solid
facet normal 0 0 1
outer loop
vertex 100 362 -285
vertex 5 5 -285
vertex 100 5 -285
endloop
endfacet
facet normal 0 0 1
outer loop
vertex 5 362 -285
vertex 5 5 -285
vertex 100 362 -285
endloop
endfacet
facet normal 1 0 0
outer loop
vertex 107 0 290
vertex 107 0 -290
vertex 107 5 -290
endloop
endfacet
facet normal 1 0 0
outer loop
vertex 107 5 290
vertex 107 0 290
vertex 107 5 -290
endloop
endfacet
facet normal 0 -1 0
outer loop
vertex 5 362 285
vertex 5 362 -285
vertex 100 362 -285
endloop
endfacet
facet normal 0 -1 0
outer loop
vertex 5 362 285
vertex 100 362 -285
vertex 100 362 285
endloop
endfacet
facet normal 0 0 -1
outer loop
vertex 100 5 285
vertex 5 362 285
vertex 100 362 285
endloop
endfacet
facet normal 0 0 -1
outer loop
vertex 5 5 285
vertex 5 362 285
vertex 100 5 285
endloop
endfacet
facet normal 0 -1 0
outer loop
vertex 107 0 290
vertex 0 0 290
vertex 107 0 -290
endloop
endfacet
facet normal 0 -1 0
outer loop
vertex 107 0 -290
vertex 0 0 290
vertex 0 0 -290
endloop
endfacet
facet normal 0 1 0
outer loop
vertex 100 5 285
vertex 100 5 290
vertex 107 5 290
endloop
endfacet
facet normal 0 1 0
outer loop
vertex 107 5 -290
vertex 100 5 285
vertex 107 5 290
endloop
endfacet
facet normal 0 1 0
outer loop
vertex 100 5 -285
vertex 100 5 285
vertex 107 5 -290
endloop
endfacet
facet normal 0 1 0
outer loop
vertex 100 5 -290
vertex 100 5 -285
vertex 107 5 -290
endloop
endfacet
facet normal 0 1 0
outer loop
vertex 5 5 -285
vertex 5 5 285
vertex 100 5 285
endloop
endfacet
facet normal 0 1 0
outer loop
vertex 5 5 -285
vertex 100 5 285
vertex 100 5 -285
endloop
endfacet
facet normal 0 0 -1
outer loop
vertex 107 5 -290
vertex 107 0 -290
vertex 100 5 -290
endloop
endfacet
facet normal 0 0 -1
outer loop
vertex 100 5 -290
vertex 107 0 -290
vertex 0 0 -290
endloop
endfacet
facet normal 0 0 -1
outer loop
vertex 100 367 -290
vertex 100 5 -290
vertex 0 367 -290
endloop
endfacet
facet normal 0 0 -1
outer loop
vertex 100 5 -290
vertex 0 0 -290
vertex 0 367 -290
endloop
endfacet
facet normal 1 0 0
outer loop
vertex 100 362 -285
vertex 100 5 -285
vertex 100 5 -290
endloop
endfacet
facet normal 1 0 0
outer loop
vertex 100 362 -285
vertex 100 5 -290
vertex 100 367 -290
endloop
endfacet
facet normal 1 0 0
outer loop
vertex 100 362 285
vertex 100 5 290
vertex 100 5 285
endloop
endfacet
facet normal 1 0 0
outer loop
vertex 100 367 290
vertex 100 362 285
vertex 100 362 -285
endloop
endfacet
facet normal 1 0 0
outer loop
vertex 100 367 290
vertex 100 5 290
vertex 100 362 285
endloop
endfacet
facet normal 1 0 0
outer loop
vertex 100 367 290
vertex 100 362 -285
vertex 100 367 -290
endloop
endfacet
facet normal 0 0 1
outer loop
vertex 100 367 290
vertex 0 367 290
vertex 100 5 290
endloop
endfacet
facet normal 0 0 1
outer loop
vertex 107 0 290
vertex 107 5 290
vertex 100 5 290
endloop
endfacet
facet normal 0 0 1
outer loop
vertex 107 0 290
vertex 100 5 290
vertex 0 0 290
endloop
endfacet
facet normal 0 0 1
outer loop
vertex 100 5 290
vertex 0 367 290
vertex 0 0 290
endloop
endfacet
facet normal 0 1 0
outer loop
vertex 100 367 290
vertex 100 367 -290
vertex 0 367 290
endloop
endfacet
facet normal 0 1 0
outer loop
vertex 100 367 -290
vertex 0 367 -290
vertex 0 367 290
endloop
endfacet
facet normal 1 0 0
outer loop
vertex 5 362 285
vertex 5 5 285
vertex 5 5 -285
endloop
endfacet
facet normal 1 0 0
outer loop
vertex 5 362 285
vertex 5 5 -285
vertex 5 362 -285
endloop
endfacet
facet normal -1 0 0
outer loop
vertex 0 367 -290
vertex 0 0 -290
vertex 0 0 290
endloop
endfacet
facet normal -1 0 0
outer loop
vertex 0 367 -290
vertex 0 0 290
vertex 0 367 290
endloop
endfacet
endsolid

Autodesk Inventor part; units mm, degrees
ref_plane "YZ Plane" through (0, 0, 0) normal (1, 0, 0) x (0, 1, 0)
ref_plane "XZ Plane" through (0, 0, 0) normal (0, 1, 0) x (-1, 0, 0)
ref_plane "XY Plane" through (0, 0, 0) normal (0, 0, 1) x (1, 0, 0)
sketch "스케치1" plane through (0, 0, 0) normal (1, 0, 0) x (0, 1, 0)
  line L0 (367, 290) -> (0, 290)
  line L1 (0, 290) -> (0, -290)
  line L2 (0, -290) -> (367, -290)
  line L3 (367, -290) -> (367, 290)
  line L4 (362, 285) -> (5, 285)
  line L5 (5, 290) -> (5, -290)
  line L6 (5, -285) -> (362, -285)
  line L7 (362, -285) -> (362, 285)
  point P0 (0, 0)
  point P1 (0, 0)
  dimension "d0" = 367
  dimension "d1" = 580
  dimension "d2" = 5
extrude "돌출1" add sketch "스케치1" along normal blind 100 contours L3 L2 L5 L6 L7 L4 L0
extrude "돌출2" add sketch "스케치1" along normal blind 107 contours L5 L2 L1 L0
extrude "돌출3" add sketch "스케치1" along normal blind 5 contours L4 L7 L6 L5
properties part number "monitor_case" material "ABS 플라스틱"
